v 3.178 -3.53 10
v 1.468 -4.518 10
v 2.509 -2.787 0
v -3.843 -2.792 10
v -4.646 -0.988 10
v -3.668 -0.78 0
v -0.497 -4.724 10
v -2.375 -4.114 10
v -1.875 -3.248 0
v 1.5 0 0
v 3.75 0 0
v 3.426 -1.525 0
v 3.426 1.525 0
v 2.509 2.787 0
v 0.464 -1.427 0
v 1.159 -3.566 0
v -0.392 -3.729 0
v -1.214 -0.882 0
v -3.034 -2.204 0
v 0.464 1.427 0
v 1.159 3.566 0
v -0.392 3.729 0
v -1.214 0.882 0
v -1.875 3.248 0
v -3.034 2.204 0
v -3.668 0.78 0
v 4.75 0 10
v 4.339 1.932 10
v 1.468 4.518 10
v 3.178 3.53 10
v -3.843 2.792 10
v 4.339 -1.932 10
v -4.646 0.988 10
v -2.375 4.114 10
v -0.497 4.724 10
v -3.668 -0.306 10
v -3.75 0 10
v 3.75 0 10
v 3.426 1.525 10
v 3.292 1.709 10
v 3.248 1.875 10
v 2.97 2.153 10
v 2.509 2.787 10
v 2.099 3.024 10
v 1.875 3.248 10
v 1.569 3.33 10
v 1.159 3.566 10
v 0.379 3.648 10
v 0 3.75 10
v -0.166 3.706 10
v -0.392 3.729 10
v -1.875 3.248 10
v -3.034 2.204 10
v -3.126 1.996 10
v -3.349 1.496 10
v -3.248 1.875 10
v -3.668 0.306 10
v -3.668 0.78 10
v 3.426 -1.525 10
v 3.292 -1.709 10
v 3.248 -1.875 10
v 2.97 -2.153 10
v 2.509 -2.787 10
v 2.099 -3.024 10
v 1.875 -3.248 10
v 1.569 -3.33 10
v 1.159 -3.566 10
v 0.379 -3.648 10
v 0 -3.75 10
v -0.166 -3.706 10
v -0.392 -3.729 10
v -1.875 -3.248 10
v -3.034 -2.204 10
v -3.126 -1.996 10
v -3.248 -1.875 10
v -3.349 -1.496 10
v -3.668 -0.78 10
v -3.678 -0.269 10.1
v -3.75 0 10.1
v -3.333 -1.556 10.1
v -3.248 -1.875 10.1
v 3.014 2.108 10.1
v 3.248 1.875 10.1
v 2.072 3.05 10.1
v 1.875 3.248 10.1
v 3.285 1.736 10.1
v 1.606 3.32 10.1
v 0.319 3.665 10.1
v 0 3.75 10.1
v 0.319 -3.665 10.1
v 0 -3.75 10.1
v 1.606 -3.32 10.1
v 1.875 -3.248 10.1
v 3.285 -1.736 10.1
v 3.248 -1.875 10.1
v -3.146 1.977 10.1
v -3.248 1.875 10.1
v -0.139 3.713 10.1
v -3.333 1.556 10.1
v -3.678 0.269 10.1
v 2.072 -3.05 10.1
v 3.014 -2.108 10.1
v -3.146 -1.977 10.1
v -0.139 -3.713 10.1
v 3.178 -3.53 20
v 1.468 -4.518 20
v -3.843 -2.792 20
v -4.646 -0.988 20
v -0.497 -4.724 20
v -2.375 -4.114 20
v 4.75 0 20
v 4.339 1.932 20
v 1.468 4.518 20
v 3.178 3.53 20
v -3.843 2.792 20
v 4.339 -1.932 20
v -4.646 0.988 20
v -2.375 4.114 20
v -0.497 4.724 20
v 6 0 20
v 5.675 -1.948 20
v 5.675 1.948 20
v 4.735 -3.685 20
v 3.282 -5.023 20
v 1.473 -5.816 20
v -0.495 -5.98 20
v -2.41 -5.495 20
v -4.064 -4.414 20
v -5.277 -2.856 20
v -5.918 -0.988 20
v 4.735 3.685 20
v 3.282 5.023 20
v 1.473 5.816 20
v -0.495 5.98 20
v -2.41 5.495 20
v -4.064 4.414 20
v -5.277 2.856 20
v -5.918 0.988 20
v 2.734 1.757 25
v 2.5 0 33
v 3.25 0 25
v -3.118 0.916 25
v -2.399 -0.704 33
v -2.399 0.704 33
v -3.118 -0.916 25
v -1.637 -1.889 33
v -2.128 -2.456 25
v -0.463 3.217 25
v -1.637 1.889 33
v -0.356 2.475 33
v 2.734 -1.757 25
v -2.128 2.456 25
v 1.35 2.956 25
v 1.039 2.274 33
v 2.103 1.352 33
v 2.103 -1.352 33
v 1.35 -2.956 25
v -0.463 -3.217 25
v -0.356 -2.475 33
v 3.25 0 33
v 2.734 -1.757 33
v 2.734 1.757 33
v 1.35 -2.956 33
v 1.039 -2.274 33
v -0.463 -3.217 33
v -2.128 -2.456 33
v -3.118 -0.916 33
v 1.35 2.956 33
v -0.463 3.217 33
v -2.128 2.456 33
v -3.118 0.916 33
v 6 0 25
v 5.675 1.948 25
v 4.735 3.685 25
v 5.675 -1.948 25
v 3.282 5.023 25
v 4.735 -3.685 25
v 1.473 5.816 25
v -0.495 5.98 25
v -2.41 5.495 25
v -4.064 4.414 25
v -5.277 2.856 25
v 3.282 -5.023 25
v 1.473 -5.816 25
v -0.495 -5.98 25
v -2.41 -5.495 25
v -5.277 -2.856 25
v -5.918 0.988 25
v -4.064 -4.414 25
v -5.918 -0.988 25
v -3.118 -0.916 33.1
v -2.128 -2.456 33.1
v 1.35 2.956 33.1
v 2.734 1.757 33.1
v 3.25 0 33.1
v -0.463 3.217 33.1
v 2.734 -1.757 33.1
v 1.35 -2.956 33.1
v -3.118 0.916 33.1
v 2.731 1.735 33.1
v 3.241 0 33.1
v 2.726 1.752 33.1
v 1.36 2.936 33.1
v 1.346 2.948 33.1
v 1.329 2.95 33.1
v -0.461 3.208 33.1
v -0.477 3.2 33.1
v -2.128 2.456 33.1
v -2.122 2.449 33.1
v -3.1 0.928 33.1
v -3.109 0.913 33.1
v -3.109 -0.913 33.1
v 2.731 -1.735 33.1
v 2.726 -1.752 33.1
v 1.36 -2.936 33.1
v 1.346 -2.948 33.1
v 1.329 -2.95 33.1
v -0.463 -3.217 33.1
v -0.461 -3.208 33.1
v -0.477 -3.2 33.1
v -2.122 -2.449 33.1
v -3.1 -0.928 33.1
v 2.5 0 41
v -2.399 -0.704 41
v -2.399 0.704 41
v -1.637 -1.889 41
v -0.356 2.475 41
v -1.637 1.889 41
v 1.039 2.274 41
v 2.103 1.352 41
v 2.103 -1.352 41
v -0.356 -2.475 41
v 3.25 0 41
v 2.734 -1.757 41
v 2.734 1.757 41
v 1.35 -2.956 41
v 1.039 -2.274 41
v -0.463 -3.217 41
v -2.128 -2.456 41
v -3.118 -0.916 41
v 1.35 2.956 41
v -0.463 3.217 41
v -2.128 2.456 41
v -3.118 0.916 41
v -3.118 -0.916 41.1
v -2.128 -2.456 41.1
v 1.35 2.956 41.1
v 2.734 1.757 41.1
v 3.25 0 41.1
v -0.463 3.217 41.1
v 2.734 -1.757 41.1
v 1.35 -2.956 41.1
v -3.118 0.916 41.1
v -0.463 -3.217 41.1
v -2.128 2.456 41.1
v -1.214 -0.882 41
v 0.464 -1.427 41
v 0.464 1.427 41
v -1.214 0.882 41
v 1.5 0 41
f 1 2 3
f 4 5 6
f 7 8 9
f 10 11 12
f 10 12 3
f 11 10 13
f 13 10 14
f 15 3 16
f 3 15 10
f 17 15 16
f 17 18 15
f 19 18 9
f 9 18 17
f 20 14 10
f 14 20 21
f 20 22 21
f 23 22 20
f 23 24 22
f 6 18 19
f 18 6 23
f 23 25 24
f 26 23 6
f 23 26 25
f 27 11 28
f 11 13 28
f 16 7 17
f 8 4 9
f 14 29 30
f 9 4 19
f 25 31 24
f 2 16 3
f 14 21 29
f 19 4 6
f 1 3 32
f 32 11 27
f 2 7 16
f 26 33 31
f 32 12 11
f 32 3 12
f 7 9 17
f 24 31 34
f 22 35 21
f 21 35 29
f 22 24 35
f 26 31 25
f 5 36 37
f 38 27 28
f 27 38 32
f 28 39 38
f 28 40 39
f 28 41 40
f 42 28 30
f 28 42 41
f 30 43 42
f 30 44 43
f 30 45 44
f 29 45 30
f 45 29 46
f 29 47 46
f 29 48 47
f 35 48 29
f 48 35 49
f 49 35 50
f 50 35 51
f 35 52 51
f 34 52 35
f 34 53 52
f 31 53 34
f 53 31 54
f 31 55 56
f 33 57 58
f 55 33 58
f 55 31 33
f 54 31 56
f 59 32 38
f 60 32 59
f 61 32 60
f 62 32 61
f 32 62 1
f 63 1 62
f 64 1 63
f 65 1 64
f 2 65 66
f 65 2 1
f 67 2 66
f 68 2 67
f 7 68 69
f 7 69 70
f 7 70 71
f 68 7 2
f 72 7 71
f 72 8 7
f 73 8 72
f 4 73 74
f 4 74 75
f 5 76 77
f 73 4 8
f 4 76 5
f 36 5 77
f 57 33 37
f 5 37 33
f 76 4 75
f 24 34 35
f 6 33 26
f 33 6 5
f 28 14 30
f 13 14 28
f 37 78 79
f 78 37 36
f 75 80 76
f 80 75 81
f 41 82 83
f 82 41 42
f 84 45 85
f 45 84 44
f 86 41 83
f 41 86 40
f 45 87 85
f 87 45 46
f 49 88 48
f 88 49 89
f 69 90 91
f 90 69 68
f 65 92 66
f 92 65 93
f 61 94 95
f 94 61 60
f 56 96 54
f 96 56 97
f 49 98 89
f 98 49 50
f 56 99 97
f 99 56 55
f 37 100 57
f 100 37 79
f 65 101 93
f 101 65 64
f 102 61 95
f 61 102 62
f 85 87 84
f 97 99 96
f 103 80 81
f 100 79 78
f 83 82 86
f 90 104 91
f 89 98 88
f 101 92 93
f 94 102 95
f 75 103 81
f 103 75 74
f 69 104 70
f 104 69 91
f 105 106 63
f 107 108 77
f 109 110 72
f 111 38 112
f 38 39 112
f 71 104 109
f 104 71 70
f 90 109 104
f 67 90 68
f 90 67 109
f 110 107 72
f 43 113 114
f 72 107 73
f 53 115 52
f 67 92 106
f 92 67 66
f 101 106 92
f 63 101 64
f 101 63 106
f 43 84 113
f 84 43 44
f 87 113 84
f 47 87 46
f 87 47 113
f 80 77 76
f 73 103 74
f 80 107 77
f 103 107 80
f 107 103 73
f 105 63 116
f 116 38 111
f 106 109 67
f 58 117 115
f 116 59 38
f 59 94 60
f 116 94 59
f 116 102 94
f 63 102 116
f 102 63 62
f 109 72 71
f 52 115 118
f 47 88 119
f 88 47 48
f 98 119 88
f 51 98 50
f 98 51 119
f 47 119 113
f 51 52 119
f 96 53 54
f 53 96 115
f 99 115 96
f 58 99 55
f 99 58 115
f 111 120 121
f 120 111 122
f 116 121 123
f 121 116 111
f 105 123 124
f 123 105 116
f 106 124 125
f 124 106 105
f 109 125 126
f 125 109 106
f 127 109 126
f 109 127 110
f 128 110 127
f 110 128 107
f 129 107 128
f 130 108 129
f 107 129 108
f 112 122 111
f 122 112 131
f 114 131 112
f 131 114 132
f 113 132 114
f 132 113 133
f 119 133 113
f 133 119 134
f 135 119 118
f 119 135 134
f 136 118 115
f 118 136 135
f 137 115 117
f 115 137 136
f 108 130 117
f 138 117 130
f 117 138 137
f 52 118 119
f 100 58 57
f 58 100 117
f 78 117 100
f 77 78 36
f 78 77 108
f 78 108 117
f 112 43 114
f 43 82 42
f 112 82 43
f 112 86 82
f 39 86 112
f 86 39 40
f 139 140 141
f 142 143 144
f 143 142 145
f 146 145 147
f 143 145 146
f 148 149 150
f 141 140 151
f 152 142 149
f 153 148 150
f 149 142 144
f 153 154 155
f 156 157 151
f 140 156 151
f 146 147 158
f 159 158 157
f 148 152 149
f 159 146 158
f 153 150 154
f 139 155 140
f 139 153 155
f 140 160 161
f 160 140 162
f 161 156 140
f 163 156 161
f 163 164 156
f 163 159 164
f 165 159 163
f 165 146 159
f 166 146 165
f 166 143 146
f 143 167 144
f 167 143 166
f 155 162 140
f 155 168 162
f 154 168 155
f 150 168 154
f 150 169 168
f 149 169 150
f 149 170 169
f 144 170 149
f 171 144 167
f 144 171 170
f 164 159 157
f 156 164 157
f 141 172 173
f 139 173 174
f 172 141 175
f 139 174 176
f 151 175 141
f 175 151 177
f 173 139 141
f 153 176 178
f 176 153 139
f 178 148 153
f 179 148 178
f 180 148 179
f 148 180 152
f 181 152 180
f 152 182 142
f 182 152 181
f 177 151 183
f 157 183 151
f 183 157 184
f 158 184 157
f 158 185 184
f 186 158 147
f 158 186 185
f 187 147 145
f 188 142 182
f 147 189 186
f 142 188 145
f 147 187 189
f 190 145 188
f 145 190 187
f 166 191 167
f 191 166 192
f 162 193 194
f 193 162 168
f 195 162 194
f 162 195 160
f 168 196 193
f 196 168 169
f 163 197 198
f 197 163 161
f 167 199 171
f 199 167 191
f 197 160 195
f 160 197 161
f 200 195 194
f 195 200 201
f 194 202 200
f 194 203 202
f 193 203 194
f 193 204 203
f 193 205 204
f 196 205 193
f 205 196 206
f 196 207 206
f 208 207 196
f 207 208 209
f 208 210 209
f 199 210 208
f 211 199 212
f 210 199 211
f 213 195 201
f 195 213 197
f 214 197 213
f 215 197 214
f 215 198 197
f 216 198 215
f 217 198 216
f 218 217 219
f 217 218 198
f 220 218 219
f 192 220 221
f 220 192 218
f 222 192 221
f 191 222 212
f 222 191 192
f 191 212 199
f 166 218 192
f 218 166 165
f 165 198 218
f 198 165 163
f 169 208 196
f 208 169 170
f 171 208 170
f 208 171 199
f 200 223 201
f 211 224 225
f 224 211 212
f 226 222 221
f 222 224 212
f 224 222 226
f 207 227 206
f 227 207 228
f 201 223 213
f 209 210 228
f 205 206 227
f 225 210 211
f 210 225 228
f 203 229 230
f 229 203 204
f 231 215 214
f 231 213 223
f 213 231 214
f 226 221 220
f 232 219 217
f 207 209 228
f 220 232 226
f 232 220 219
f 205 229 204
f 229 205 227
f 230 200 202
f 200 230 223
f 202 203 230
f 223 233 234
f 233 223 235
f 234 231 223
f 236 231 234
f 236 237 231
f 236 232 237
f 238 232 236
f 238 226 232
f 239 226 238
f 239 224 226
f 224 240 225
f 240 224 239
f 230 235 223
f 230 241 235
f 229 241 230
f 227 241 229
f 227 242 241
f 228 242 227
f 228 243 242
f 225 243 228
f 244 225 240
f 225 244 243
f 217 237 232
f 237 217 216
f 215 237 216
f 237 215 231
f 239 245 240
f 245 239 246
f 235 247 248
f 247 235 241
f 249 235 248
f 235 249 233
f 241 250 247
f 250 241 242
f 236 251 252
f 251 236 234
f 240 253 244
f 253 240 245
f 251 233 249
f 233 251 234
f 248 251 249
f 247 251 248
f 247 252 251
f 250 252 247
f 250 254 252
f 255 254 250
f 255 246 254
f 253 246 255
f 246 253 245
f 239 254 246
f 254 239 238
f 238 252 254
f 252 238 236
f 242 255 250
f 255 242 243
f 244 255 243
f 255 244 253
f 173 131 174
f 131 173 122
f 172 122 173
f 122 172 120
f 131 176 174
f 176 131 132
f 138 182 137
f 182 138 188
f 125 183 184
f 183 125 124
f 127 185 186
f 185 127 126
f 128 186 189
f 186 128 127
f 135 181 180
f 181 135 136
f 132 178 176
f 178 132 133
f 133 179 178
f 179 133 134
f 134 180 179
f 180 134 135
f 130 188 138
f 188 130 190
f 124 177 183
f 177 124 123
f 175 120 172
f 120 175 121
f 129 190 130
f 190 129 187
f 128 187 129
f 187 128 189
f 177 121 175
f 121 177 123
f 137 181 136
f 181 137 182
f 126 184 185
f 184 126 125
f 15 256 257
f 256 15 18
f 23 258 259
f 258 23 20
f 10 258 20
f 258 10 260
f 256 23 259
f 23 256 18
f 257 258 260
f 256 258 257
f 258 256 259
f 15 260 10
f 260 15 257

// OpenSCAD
// Hose-barb reducer
// Print standing upright along Z axis

// Dimensions
inner_diameter_8mm = 8.0;  // Inner diameter for 8mm tubing
inner_diameter_5mm = 5.0;  // Inner diameter for 5mm tubing
barb_height_8mm = 10.0;     // Height of barbs for 8mm tubing
barb_height_5mm = 8.0;    // Height of barbs for 5mm tubing
barb_base_diameter_8mm = 7.5; // Base diameter of 8mm barbs
barb_top_diameter_8mm = 9.5;  // Top diameter of 8mm barbs
barb_base_diameter_5mm = 6.5; // Base diameter of 5mm barbs
barb_top_diameter_5mm = 5.0; // Top diameter of 5mm barbs
collar_diameter = 12.0;      // Diameter of collar
collar_height = 5.0;       // Height of collar
z_start_8mm = 0.0;         // Start Z for 8mm barbs
z_end_8mm = 20.0;          // End Z for 8mm barbs
z_start_collar = 20.0;     // Start Z for collar
z_end_collar = 25.0;       // End Z for collar
z_start_5mm = 25.0;        // Start Z for 5mm barbs
z_end_5mm = 41.0;          // End Z for 5mm barbs
bore_diameter = 3.0;     // Diameter of central bore

// Create the main body
module reducer() {
    union() {
        // 8mm barbs
        for (i = [0, 1]) {
            translate([0, 0, z_start_8mm + i * barb_height_8mm])
            barb_8mm();
        }
        
        // Collar
        translate([0, 0, z_start_collar])
        cylinder(h = collar_height, d = collar_diameter, center = false);
        
        // 5mm barbs
        for (i = [0, 1]) {
            translate([0, 0, z_start_5mm + i * barb_height_5mm])
            barb_5mm();
        }
    }
}

// Create 8mm barb with sawtooth profile
module barb_8mm() {
    union() {
        // Main barb body
        cylinder(h = barb_height_8mm, d1 = barb_base_diameter_8mm, d2 = barb_top_diameter_8mm, center = false);
        
        // Step back to base diameter
        translate([0, 0, barb_height_8mm])
        cylinder(h = 0.1, d = barb_base_diameter_8mm, center = false);
    }
}

// Create 5mm barb with sawtooth profile
module barb_5mm() {
    union() {
        // Main barb body
        cylinder(h = barb_height_5mm, d1 = barb_base_diameter_5mm, d2 = barb_top_diameter_5mm, center = false);
        
        // Step back to base diameter
        translate([0, 0, barb_height_5mm])
        cylinder(h = 0.1, d = barb_base_diameter_5mm, center = false);
    }
}

// Central bore
module bore() {
    cylinder(h = z_end_5mm, d = bore_diameter, center = false);
}

// Render the complete part
difference() {
    reducer();
    bore();
}
